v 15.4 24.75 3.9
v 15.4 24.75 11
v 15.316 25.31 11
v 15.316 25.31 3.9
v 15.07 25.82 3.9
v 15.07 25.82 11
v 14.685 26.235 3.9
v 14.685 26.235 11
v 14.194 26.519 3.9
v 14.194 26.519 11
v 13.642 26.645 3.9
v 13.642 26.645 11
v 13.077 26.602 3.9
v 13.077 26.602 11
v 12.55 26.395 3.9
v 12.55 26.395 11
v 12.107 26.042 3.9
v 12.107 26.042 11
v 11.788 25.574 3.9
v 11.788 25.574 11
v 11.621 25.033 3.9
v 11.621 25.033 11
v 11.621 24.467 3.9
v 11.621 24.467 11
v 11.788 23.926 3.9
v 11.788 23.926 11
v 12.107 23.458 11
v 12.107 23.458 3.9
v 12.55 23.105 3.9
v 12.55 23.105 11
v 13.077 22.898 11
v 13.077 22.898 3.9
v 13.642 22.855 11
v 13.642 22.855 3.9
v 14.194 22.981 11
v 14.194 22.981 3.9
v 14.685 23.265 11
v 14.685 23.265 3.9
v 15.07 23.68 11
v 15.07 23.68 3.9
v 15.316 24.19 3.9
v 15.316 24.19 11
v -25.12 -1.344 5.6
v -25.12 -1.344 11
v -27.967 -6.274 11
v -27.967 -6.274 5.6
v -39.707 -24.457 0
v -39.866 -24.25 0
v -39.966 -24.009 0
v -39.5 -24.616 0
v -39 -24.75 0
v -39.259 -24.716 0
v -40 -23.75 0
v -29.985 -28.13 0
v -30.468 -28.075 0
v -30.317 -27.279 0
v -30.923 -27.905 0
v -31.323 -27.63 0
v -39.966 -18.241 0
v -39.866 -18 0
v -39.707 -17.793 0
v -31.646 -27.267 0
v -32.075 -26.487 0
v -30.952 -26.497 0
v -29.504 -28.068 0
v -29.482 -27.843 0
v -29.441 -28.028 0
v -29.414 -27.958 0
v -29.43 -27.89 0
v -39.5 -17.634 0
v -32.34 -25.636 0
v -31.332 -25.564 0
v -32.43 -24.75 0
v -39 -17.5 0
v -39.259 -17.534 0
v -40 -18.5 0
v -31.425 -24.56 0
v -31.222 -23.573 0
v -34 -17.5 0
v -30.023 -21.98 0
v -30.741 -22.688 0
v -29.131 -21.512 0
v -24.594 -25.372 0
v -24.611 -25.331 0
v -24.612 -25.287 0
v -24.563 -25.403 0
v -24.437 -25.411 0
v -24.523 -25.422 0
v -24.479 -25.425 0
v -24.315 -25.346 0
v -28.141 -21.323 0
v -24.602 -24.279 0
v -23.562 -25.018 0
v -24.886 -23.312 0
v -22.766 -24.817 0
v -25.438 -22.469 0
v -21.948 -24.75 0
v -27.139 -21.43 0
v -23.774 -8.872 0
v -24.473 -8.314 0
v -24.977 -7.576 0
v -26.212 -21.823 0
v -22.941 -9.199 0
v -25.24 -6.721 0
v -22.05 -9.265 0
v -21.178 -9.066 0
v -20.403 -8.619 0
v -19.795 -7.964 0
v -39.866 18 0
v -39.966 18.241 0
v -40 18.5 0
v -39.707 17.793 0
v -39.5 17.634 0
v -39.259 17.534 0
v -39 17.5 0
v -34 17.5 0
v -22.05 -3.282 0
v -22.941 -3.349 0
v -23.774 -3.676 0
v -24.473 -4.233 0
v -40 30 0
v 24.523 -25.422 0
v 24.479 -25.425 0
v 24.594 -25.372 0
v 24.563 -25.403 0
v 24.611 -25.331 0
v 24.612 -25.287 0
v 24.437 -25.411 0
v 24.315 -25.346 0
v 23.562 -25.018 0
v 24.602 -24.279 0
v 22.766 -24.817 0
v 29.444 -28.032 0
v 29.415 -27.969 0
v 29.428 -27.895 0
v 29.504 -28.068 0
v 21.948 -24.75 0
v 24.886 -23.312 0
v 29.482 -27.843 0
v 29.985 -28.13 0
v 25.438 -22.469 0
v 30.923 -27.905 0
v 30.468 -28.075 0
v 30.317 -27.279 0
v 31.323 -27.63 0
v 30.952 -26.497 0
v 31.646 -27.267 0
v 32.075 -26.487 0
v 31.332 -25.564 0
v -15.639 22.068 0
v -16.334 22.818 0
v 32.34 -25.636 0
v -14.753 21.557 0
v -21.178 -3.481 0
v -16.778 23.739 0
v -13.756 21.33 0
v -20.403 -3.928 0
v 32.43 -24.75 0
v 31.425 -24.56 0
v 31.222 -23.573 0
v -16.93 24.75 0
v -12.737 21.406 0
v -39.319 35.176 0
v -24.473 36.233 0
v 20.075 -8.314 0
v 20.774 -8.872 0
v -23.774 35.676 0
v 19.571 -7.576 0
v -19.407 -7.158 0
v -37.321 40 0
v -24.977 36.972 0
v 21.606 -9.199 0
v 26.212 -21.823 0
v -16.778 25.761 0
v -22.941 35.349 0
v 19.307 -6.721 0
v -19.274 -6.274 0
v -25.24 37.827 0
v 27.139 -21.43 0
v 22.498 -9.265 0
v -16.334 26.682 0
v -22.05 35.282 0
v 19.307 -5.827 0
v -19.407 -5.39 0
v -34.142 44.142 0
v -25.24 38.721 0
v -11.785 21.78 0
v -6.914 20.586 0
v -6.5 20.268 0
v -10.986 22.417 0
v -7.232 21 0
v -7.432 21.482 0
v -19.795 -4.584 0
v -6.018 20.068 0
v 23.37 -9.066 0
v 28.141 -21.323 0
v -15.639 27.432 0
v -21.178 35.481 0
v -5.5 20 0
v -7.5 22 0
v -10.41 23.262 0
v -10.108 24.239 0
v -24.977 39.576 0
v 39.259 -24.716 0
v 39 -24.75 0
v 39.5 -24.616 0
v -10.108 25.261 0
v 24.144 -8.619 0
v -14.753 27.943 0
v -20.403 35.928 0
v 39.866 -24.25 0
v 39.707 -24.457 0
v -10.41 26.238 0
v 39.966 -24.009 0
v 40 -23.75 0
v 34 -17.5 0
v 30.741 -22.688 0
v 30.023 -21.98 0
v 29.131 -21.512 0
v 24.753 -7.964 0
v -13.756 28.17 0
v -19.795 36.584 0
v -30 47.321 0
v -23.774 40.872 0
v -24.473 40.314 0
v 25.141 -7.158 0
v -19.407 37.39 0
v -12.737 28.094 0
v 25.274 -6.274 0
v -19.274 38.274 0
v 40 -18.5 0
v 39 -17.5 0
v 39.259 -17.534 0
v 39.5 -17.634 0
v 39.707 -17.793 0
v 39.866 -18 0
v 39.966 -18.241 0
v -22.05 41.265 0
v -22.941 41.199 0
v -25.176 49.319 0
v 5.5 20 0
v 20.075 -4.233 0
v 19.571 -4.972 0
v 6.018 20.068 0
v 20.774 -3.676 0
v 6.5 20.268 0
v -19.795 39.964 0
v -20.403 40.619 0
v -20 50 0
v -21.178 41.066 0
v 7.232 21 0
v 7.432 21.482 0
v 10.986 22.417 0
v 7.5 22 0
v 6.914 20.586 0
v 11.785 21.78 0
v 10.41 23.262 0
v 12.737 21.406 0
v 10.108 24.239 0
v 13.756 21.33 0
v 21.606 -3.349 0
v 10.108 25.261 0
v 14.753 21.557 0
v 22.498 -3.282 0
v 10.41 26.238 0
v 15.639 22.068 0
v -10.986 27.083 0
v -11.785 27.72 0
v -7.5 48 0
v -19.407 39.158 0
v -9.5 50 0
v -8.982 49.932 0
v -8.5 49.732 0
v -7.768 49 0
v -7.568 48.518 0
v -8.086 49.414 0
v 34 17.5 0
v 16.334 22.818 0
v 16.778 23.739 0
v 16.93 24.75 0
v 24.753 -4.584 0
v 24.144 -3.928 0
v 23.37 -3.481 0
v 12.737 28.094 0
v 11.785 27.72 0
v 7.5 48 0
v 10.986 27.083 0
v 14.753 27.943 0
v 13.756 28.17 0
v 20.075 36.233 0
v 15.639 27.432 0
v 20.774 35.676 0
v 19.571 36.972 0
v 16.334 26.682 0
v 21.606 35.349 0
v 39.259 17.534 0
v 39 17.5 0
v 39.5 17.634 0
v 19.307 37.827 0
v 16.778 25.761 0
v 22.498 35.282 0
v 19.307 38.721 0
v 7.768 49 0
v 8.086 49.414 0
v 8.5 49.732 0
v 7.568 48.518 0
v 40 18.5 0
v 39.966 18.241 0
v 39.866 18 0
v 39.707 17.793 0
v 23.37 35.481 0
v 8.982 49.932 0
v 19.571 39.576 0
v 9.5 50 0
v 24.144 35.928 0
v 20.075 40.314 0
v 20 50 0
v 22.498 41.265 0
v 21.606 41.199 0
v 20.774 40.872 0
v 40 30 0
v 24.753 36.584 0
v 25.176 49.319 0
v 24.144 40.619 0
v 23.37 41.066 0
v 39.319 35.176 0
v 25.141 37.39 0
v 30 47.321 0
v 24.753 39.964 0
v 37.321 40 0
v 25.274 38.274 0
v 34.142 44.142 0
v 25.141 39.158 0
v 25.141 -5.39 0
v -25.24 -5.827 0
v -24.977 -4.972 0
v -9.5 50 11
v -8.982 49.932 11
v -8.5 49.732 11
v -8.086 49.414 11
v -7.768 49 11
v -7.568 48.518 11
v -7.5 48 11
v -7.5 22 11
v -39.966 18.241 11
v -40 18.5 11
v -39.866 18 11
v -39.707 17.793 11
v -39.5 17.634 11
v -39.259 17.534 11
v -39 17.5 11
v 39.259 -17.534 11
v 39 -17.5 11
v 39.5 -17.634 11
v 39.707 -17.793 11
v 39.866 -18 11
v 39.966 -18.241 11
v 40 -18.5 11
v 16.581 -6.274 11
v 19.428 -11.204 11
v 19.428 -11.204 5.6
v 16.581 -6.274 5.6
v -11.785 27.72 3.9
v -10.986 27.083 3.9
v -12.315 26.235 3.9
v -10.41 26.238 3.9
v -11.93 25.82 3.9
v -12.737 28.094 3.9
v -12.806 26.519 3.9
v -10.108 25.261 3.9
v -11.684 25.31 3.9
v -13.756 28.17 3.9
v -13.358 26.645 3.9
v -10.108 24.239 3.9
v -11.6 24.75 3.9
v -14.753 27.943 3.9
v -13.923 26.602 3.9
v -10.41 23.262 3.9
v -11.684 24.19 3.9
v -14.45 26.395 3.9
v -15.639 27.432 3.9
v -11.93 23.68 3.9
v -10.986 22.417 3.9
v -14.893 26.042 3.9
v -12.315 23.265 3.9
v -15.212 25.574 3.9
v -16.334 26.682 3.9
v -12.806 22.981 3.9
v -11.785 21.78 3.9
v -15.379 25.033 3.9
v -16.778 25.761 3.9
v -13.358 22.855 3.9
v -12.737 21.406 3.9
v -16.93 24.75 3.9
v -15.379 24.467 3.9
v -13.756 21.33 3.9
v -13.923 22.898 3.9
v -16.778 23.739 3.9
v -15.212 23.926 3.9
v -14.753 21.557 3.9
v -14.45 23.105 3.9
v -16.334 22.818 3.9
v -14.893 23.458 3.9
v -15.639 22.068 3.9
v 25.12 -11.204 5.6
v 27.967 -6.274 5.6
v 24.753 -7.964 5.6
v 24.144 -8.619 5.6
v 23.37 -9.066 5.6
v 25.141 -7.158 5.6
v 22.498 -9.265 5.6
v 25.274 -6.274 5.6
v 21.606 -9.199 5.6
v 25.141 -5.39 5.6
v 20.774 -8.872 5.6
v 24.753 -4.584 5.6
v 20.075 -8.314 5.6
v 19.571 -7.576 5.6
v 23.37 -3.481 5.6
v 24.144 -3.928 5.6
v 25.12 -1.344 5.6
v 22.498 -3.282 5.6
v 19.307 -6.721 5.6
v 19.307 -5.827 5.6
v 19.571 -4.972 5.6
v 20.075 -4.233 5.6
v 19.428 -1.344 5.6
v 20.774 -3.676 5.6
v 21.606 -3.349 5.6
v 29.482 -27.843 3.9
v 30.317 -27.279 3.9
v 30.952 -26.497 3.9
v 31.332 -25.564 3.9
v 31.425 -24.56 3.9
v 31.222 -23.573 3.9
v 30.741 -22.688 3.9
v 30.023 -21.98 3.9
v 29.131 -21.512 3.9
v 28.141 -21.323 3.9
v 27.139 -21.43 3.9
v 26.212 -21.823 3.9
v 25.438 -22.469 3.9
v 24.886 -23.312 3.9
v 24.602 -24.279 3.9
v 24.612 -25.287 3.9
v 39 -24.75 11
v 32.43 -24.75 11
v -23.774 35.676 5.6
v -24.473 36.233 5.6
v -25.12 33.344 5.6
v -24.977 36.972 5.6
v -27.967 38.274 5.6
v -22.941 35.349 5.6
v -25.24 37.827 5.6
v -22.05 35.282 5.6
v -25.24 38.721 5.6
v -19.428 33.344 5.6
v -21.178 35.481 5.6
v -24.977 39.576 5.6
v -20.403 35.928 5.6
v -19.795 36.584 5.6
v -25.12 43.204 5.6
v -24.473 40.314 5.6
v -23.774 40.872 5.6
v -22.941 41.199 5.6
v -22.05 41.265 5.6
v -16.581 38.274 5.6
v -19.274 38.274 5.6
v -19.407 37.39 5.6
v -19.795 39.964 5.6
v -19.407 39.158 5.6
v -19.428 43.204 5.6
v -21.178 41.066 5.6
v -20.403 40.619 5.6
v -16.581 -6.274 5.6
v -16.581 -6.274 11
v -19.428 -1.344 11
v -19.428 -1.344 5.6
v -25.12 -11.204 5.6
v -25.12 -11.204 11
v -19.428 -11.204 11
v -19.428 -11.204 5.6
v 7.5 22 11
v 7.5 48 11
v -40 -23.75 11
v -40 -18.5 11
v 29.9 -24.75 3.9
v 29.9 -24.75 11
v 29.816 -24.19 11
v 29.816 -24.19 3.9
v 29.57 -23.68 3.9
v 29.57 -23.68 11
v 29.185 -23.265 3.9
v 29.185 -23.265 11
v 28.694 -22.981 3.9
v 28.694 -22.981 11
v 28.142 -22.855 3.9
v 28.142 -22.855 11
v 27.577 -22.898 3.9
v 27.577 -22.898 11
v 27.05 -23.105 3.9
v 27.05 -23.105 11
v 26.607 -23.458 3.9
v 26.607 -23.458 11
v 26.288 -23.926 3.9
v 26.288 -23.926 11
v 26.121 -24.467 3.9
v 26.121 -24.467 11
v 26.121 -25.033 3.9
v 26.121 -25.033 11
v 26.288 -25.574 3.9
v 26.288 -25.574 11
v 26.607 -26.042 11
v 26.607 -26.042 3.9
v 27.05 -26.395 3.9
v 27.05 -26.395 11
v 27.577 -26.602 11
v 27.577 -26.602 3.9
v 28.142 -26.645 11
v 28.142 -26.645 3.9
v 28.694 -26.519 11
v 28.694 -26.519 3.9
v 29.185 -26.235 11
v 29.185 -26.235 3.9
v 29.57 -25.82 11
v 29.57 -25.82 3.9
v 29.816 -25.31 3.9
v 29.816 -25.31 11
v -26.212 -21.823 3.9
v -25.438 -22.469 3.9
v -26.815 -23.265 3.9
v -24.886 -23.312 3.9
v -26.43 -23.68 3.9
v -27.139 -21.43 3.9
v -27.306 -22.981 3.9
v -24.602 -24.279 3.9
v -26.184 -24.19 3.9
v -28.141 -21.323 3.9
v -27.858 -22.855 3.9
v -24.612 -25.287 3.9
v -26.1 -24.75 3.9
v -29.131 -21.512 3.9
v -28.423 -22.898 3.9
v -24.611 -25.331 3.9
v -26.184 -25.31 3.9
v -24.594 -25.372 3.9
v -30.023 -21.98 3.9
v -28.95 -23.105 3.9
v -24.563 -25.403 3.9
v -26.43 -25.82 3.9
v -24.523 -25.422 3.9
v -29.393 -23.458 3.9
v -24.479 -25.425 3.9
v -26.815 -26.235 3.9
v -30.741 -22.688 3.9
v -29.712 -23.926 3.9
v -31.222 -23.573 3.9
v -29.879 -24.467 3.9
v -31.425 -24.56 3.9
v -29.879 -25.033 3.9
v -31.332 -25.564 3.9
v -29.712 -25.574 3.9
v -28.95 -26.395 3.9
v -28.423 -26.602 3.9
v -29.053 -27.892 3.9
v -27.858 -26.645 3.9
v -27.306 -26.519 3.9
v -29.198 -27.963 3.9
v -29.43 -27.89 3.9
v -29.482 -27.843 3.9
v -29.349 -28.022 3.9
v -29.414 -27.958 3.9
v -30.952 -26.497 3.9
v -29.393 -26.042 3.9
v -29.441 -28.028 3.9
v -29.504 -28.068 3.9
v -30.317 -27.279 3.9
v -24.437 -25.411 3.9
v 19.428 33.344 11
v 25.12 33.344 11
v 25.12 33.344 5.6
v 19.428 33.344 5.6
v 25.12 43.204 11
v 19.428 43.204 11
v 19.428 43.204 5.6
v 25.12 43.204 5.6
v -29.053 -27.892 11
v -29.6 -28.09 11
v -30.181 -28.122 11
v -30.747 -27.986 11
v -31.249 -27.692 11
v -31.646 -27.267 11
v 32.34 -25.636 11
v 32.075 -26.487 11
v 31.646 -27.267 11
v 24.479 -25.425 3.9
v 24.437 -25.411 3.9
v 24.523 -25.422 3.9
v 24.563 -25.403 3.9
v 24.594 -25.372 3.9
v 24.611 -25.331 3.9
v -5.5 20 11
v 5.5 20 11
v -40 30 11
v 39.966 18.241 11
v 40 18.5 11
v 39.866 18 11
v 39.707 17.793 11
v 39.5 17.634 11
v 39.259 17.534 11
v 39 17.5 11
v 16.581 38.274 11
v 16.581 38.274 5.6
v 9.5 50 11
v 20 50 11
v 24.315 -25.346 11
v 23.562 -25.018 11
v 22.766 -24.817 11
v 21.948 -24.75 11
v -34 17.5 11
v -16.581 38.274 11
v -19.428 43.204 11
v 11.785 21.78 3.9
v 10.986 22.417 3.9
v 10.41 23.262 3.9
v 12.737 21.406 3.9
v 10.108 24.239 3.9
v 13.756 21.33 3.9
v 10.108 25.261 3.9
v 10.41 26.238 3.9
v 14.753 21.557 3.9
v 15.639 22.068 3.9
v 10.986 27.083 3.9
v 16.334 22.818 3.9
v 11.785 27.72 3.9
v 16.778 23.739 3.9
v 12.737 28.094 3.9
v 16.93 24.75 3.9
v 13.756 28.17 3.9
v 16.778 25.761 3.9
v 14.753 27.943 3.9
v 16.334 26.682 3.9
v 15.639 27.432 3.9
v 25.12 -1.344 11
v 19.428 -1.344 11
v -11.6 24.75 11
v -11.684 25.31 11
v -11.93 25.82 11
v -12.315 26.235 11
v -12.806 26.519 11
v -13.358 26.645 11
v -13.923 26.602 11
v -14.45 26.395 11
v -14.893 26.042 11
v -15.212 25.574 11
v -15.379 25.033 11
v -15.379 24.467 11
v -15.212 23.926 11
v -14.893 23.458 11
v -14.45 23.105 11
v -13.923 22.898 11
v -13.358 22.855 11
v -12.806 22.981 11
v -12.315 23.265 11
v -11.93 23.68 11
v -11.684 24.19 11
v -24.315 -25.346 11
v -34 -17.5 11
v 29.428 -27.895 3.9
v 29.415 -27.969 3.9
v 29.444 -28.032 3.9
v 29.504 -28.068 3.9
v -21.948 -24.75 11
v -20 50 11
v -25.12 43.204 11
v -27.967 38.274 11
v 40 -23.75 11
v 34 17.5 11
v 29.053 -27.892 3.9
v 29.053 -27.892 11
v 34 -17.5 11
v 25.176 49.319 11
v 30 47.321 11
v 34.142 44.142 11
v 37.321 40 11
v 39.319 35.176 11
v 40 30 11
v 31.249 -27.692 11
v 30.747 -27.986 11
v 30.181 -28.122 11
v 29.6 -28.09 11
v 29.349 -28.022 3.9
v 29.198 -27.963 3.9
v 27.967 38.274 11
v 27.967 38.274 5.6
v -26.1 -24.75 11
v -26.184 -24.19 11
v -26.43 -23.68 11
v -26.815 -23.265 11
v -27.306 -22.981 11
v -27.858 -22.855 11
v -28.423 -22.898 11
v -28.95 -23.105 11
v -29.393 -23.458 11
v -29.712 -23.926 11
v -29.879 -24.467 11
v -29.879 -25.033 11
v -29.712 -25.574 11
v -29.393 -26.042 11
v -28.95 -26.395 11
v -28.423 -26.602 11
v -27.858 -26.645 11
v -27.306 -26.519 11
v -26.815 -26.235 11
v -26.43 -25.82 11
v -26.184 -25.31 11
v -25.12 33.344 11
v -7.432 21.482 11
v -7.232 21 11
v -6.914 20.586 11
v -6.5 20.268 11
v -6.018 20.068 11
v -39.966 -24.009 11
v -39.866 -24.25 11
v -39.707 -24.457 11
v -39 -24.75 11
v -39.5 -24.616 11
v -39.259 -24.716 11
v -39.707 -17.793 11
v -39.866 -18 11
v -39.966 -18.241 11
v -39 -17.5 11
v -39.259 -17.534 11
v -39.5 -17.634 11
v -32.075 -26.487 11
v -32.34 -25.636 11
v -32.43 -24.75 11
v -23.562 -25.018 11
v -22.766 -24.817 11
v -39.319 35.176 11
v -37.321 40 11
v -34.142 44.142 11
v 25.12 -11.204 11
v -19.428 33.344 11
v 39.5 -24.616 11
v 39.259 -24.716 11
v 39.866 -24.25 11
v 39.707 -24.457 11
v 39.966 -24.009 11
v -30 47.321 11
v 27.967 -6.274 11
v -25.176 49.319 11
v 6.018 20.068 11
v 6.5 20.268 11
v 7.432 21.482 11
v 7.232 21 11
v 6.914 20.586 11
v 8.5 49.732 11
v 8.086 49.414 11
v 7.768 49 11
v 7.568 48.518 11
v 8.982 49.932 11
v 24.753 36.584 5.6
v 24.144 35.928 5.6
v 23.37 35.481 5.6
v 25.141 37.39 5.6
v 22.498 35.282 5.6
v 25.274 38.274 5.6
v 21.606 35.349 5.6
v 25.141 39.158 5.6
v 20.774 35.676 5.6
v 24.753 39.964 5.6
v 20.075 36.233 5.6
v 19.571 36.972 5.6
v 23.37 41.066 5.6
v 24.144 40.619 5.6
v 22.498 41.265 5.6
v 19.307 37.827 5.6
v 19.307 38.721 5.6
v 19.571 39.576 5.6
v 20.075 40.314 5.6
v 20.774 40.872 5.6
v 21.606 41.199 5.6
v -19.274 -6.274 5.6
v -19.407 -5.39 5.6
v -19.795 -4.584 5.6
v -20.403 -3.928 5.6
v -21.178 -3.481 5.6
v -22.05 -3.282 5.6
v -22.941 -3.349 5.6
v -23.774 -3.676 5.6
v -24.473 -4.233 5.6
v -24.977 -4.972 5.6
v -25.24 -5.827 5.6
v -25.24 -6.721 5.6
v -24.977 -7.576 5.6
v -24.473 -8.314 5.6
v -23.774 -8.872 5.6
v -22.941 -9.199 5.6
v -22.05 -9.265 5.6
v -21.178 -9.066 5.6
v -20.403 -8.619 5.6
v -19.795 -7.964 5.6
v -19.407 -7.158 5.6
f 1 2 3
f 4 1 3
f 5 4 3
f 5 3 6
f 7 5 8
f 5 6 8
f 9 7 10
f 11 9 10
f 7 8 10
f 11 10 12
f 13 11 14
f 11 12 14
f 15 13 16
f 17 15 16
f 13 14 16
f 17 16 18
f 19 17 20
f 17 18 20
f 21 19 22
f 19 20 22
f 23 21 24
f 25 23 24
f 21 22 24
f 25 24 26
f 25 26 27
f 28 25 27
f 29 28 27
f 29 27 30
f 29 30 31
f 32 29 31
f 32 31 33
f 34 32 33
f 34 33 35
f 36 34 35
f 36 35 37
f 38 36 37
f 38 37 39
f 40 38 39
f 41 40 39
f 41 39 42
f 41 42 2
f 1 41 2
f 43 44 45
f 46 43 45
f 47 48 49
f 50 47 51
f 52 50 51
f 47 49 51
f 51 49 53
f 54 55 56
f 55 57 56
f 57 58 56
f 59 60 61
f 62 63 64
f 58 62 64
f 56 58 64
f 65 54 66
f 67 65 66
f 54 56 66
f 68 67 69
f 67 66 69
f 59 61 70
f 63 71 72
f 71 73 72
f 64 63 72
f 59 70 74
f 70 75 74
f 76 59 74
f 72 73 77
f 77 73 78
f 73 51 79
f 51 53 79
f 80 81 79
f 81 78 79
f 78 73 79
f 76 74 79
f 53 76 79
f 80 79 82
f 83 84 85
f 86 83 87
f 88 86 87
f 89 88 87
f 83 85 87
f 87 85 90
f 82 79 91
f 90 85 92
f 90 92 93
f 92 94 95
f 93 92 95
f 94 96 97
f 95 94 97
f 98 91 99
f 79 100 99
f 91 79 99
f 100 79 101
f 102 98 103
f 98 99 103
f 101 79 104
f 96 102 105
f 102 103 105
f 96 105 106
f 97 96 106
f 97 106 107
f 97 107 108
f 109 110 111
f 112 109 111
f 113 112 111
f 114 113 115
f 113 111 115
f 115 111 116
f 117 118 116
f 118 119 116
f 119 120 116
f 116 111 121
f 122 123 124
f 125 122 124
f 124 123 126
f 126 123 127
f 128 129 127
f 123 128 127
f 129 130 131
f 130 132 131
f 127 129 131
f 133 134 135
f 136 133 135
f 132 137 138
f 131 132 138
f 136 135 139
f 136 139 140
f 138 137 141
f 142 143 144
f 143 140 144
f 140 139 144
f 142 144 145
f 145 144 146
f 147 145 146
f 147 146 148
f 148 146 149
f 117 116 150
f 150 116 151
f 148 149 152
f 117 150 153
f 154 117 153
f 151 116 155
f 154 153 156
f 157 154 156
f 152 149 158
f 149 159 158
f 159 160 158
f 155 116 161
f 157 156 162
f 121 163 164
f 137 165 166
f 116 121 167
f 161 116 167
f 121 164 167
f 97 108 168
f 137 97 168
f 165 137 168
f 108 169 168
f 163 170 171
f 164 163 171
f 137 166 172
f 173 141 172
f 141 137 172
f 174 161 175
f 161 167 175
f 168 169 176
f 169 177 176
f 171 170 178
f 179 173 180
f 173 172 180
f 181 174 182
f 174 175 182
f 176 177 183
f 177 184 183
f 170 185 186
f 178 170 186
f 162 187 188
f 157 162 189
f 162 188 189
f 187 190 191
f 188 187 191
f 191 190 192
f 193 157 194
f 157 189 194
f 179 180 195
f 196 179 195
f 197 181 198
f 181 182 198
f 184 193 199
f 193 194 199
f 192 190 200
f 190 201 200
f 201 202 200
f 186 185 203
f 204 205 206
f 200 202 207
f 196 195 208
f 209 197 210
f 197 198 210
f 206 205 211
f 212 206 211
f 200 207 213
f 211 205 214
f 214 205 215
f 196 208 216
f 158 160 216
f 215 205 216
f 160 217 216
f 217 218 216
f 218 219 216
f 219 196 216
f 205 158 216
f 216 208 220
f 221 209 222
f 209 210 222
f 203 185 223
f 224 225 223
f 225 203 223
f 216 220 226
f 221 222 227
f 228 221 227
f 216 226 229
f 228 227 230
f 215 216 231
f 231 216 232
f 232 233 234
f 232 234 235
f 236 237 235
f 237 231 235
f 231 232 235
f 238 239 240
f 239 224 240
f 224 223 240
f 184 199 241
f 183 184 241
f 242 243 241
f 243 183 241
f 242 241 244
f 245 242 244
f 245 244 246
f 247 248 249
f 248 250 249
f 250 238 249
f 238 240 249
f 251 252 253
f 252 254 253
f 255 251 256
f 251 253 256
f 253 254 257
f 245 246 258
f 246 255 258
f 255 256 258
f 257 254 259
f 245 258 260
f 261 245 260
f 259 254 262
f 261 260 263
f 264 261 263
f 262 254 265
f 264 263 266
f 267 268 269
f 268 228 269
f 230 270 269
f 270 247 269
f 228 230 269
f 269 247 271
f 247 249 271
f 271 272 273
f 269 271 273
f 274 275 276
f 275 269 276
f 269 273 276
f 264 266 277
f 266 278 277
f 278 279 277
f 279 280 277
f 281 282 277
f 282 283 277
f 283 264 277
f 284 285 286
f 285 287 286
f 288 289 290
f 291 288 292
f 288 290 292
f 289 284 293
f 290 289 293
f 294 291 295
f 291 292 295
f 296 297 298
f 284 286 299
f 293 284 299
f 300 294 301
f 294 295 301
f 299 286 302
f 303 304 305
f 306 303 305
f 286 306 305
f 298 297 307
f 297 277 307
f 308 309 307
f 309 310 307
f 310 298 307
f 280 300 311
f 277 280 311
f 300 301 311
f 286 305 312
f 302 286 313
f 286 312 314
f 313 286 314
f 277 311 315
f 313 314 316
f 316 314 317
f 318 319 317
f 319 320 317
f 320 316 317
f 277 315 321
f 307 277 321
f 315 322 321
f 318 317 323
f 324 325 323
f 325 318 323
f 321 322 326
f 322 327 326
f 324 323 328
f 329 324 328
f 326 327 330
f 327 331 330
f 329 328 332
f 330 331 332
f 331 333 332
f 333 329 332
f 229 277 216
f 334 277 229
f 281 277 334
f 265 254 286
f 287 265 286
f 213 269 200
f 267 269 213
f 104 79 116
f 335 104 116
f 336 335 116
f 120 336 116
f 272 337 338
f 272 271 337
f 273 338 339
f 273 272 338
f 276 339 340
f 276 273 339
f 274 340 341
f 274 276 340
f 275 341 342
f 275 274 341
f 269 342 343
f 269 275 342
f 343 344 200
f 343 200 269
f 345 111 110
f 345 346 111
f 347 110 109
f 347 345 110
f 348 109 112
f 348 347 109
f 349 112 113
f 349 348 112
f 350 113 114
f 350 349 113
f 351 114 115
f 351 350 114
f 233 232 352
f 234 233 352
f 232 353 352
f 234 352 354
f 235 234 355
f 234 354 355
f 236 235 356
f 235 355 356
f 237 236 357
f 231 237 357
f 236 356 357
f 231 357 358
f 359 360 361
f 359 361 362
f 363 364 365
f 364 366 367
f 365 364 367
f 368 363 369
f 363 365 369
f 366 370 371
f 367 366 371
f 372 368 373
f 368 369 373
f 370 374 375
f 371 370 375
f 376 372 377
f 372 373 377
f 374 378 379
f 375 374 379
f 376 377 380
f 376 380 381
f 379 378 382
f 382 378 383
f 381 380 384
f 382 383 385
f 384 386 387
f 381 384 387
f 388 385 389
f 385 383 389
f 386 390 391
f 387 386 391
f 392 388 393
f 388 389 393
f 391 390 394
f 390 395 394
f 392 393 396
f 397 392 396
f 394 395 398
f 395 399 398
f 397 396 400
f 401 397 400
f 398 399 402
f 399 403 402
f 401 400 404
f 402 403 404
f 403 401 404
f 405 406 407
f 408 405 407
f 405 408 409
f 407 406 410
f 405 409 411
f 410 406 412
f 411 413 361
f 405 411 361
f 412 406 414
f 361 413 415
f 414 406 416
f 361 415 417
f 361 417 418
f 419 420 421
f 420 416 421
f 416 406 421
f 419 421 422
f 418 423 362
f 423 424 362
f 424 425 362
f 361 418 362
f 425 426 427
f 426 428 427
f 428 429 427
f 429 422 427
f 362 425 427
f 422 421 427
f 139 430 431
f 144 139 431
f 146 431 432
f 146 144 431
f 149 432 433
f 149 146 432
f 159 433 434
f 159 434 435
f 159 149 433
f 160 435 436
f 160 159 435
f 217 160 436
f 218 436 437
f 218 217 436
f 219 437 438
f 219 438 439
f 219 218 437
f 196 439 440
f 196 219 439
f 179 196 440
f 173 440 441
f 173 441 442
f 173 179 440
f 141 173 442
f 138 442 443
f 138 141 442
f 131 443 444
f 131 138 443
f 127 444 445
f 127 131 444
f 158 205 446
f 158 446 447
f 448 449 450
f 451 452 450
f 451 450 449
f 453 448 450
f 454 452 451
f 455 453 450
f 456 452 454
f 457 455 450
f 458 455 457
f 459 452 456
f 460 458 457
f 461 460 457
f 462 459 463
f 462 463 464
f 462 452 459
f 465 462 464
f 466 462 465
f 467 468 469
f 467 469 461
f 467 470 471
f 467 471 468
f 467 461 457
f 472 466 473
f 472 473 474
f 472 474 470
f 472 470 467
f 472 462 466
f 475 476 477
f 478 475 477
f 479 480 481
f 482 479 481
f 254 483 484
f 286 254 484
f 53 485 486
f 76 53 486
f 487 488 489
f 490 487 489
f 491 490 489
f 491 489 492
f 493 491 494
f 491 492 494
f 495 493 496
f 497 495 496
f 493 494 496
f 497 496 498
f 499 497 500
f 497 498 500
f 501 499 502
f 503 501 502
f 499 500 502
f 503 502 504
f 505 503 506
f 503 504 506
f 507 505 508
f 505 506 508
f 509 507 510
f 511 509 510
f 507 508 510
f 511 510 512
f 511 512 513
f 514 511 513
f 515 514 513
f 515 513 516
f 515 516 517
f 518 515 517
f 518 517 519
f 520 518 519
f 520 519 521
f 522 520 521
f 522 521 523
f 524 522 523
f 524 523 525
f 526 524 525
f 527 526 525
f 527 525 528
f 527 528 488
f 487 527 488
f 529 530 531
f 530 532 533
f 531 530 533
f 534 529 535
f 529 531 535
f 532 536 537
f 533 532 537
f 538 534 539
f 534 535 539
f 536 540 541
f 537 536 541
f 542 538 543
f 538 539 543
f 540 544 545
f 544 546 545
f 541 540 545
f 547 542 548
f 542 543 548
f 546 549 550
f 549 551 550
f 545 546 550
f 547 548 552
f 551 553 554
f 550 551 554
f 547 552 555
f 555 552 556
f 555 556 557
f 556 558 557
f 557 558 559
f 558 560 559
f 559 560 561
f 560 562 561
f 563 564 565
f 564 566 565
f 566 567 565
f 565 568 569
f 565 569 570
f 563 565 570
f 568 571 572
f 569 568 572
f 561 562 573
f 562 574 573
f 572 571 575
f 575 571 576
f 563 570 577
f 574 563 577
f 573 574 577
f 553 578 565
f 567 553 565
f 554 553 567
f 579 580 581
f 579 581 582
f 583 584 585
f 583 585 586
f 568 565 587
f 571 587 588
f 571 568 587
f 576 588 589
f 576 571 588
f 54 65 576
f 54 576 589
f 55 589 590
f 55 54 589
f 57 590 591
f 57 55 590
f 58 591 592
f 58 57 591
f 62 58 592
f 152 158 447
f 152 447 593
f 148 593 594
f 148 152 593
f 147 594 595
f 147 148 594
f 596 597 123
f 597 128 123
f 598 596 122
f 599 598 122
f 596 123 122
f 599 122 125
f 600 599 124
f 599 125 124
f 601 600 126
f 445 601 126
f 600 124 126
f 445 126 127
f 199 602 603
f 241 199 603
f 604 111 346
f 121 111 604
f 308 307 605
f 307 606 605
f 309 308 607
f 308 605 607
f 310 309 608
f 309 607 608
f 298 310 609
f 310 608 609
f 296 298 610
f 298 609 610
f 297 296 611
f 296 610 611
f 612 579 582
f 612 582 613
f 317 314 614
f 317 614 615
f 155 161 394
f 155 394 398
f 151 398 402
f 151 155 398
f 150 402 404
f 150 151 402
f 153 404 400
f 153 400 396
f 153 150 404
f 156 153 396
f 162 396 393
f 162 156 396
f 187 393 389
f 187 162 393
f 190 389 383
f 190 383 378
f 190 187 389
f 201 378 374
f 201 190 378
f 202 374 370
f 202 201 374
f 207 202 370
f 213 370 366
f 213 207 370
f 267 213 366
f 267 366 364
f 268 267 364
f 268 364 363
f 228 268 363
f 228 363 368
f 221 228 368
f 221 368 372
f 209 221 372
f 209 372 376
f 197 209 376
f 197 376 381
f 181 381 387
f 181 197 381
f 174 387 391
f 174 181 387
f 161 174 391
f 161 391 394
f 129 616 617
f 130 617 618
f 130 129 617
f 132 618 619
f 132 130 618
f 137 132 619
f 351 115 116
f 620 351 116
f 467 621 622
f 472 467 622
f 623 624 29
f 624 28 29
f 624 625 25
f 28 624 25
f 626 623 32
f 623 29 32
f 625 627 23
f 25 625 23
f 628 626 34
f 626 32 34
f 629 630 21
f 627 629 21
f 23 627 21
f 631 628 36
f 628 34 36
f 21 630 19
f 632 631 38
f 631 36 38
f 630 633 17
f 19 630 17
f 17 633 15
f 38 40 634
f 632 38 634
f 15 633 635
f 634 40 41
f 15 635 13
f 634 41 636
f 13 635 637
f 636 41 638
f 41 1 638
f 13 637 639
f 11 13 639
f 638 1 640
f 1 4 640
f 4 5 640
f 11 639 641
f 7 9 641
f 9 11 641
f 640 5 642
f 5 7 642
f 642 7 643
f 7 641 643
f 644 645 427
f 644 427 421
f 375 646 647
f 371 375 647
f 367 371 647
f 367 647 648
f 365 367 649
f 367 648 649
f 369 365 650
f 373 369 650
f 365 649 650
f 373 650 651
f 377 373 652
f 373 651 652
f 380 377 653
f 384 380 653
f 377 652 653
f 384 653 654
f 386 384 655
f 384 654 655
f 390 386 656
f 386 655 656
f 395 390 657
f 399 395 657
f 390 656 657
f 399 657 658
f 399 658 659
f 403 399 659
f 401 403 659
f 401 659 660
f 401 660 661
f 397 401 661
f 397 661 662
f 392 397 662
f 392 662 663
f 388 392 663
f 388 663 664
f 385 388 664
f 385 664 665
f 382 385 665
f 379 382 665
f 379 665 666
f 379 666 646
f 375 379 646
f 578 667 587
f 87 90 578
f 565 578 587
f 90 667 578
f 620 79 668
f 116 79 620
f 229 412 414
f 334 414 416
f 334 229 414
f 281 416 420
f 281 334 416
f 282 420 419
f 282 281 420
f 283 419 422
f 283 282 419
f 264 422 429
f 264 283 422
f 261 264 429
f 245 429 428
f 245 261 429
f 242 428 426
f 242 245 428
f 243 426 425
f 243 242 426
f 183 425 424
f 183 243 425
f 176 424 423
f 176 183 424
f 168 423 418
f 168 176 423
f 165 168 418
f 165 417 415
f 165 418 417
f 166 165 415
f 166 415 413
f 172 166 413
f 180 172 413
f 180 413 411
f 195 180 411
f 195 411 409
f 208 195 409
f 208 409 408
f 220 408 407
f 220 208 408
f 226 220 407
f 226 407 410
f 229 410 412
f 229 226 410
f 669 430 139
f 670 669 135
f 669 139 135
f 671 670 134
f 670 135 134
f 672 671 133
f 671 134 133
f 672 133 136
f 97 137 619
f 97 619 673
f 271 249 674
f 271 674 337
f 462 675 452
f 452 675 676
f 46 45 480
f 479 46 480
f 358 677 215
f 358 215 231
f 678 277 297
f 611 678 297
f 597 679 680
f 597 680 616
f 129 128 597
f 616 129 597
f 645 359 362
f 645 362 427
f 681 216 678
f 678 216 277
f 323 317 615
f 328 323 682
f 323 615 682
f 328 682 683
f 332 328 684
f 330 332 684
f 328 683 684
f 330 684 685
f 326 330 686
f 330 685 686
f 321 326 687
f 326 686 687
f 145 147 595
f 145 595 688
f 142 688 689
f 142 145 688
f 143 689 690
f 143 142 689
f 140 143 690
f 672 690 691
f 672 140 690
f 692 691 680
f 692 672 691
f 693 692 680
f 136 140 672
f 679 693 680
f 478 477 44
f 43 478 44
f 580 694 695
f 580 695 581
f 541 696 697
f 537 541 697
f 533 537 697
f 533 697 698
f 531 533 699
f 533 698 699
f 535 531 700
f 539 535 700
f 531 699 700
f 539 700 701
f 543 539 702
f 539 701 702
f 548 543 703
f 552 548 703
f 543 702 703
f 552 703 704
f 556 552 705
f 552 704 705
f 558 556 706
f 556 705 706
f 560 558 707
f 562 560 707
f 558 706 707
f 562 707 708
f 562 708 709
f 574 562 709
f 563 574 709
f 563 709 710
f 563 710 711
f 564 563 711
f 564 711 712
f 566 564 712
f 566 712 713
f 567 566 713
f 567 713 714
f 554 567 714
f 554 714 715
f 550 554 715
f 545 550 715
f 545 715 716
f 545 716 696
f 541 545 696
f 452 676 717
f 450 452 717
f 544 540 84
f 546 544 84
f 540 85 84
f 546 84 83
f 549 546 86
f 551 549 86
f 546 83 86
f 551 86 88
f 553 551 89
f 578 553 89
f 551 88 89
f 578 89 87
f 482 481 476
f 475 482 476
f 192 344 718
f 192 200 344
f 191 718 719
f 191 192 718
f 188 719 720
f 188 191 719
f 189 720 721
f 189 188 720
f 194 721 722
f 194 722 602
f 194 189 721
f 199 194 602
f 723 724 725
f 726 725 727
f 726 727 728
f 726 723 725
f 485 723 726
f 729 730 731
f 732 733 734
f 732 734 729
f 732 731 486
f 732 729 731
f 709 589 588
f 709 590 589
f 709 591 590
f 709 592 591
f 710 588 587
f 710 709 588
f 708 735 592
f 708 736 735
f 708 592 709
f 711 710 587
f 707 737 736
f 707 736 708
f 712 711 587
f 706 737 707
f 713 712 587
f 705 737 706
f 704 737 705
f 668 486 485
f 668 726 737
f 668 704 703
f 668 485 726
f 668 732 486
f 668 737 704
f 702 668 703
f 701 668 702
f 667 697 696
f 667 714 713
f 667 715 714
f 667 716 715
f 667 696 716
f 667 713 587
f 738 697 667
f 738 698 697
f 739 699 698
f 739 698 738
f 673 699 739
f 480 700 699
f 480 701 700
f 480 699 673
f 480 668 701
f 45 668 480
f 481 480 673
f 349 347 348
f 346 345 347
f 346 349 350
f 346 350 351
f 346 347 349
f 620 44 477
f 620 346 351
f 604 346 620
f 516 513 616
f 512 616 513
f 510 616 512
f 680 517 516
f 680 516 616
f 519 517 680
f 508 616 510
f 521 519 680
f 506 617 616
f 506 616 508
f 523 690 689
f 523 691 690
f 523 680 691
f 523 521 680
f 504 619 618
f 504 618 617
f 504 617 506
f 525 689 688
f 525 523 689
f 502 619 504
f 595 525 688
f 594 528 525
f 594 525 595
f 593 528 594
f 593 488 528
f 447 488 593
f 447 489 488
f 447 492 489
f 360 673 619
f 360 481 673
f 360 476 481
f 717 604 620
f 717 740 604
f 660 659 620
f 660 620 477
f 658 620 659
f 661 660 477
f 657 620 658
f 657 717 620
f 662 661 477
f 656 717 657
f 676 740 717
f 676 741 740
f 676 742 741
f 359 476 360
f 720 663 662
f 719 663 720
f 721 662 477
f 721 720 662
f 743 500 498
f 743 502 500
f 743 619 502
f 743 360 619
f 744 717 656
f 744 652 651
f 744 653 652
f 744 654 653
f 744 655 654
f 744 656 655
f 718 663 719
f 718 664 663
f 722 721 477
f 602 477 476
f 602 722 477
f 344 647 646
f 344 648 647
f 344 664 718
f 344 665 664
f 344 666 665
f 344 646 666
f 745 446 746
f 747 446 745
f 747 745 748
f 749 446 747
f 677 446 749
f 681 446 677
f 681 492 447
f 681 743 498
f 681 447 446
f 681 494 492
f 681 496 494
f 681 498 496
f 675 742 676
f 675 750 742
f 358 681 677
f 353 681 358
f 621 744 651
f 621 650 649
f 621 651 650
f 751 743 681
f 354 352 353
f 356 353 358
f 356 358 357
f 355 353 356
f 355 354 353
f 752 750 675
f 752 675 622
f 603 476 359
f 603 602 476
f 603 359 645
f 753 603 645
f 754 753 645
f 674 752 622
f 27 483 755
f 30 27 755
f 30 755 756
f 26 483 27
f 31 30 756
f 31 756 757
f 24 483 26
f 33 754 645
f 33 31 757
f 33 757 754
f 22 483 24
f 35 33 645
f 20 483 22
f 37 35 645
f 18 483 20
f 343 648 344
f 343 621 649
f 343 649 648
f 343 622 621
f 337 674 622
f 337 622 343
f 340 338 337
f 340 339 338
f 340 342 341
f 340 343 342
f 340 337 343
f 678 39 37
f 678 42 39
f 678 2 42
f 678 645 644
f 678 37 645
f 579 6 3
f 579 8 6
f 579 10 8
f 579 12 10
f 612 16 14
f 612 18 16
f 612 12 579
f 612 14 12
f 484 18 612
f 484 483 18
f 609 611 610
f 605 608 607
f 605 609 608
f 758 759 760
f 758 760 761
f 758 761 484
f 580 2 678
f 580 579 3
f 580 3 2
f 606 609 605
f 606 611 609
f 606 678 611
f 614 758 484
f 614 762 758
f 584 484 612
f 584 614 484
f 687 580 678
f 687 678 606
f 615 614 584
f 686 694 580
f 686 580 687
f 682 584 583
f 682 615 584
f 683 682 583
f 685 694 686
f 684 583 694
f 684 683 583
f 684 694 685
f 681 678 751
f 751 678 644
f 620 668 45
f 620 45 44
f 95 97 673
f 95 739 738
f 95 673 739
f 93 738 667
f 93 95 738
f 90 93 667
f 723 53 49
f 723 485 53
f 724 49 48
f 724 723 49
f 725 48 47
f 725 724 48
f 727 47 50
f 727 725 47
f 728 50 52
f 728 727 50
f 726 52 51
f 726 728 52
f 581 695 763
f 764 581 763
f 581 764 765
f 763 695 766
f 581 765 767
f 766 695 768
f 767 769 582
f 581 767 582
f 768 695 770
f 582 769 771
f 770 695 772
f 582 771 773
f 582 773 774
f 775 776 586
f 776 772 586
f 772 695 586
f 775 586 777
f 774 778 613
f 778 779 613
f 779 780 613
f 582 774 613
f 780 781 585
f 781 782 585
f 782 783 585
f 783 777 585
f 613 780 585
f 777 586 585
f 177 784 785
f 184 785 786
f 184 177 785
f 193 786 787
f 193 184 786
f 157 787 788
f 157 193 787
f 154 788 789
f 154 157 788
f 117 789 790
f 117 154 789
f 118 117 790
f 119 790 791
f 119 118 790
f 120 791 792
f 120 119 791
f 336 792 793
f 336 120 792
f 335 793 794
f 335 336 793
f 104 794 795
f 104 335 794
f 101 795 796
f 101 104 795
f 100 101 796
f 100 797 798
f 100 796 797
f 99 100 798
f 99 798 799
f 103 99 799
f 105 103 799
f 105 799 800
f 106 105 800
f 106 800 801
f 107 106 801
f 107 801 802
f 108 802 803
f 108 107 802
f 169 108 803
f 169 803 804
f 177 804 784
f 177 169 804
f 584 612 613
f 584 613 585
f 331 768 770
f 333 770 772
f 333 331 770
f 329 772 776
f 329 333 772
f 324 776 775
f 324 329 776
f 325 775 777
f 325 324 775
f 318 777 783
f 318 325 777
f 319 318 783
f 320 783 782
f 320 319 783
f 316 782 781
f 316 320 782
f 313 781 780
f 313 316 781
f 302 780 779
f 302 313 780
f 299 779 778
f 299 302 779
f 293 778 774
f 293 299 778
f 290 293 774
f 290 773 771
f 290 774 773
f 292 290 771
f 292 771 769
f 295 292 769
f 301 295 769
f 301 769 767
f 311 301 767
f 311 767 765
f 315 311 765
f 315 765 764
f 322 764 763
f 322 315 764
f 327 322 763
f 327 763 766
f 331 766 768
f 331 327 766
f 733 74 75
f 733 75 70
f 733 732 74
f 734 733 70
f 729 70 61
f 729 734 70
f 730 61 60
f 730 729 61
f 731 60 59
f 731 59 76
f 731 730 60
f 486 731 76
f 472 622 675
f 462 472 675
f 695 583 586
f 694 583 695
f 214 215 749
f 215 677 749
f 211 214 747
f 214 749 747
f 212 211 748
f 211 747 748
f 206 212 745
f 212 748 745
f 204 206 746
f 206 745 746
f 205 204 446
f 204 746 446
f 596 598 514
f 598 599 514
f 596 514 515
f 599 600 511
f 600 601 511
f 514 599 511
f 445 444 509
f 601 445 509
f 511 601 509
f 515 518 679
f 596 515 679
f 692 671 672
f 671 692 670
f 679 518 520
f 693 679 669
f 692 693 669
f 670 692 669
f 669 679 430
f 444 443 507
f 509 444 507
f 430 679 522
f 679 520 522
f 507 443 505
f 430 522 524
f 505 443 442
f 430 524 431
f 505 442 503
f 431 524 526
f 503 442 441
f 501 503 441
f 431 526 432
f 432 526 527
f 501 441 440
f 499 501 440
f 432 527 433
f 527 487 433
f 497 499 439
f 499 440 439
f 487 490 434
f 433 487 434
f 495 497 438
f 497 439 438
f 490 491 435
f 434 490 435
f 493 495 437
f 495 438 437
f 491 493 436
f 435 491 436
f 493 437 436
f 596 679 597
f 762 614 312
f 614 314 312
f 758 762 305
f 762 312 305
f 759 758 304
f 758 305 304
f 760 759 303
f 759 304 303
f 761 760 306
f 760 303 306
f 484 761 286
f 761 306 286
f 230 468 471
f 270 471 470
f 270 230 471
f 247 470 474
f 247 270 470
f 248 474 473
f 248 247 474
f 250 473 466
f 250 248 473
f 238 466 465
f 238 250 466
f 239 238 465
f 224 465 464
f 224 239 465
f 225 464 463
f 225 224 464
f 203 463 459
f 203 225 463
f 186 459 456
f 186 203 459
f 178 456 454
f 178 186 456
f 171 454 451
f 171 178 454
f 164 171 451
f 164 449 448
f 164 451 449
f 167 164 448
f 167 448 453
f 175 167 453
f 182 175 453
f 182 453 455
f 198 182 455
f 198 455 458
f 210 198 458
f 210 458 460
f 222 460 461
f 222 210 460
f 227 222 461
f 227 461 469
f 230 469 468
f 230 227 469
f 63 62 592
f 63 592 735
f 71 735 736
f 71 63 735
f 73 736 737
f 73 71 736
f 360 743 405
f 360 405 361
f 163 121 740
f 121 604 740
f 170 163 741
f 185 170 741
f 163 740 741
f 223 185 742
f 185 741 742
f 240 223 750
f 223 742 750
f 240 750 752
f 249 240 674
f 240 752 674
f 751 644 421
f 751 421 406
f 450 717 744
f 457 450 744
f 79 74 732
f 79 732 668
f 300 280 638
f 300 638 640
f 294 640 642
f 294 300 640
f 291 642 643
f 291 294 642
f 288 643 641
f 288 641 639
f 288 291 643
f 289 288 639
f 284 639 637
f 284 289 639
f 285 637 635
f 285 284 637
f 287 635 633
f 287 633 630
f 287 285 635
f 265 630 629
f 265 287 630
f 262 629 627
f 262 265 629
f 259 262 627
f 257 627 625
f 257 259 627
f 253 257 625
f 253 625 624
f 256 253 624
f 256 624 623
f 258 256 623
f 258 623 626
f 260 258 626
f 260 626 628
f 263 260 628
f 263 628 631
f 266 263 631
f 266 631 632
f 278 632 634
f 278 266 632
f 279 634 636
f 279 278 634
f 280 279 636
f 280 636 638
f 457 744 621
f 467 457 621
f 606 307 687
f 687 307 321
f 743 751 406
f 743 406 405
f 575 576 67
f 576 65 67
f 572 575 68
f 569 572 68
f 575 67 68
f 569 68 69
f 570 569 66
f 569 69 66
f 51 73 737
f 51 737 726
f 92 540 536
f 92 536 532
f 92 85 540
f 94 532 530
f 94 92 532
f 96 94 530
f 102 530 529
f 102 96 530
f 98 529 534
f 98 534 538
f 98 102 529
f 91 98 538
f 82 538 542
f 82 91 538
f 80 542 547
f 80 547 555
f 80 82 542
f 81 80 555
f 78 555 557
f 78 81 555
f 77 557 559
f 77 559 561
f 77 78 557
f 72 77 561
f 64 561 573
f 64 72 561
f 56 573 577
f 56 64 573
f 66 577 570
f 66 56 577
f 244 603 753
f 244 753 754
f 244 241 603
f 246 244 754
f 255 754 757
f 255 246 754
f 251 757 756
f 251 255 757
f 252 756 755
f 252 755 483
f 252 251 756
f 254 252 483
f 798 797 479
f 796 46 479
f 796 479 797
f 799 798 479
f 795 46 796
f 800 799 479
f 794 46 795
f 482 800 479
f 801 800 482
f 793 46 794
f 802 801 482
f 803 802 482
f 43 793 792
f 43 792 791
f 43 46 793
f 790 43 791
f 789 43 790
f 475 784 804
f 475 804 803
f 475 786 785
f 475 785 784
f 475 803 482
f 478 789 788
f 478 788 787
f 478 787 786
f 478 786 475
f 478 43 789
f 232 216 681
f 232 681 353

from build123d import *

# Parameters (mm, degrees)
SKETCH_1_W                   = 80
SKETCH_1_H                   = 100
EXTRUDE_1_DEPTH              = 11
SKETCH_7_W                   = 15
SKETCH_7_H                   = 30
CUT_EXTRUDE_1_DEPTH          = 16
HOLE_WIZARD_M4_1_D           = 3.3
HOLE_WIZARD_M4_1_CSINK_D     = 4.05
HOLE_WIZARD_M4_1_CSINK_ANGLE = 90
FILLET_1_R                   = 20
FILLET_2_R                   = 2
SKETCH_9_W                   = 6
SKETCH_9_H                   = 35
CUT_EXTRUDE_2_DEPTH          = 11
SKETCH_11_R                  = 3
CUT_EXTRUDE_4_DEPTH          = 15
SKETCH_12_R                  = 3.43
CUT_EXTRUDE_5_DEPTH          = 3.9
CUT_EXTRUDE_6_DEPTH          = 5.4
CUT_EXTRUDE_7_DEPTH          = 14
SKETCH_15_R                  = 1.9
CUT_EXTRUDE_8_DEPTH          = 14
FILLET_4_R                   = 0.12
FILLET_5_R                   = 1


with BuildPart() as part:
    # 草图1 → 凸台-拉伸1 (new body)
    with BuildSketch(Plane.XY):
        Rectangle(SKETCH_1_W, SKETCH_1_H)
    extrude(amount=EXTRUDE_1_DEPTH)

    # 草图7 → 切除-拉伸1 (cut)
    with BuildSketch(Plane.XY.offset(11)):
        with Locations((0, 35)):
            Rectangle(SKETCH_7_W, SKETCH_7_H)
    extrude(amount=-CUT_EXTRUDE_1_DEPTH, mode=Mode.SUBTRACT)

    # M4 螺纹孔1 (through all)
    with Locations(Plane(origin=(13.5, 24.75, 0), x_dir=(-1, 0, 0), z_dir=(0, 0, -1))):
        with Locations((0, 0), (27, 0), (41.5, -49.5), (-14.5, -49.5)):
            CounterSinkHole(HOLE_WIZARD_M4_1_D / 2, HOLE_WIZARD_M4_1_CSINK_D / 2, counter_sink_angle=HOLE_WIZARD_M4_1_CSINK_ANGLE)

    # 圆角1
    fillet_1_edges = [part.edges().sort_by_distance(p)[0] for p in [
        (-40, 50, 5.5),
        (40, 50, 5.5),
    ]]
    fillet(fillet_1_edges, radius=FILLET_1_R)

    # 圆角2
    fillet_2_edges = [part.edges().sort_by_distance(p)[0] for p in [
        (-7.5, 20, 5.5),
        (-7.5, 50, 5.5),
        (7.5, 50, 5.5),
        (7.5, 20, 5.5),
        (40, -50, 5.5),
        (-40, -50, 5.5),
    ]]
    fillet(fillet_2_edges, radius=FILLET_2_R)

    # 草图9 → 切除-拉伸2 (cut)
    with BuildSketch(Plane.XY):
        with Locations((37, 0)):
            Rectangle(SKETCH_9_W, SKETCH_9_H)
        with Locations((-37, 0)):
            Rectangle(SKETCH_9_W, SKETCH_9_H)
    extrude(amount=CUT_EXTRUDE_2_DEPTH, mode=Mode.SUBTRACT)

    # 草图11 → 切除-拉伸4 (cut)
    with BuildSketch(Plane.XY):
        with Locations((-22.273863607, 38.273863607)):
            Circle(SKETCH_11_R)
        with Locations((22.273863607, 38.273863607)):
            Circle(SKETCH_11_R)
        with Locations((22.273863607, -6.273863607)):
            Circle(SKETCH_11_R)
        with Locations((-22.273863607, -6.273863607)):
            Circle(SKETCH_11_R)
    extrude(amount=CUT_EXTRUDE_4_DEPTH, mode=Mode.SUBTRACT)

    # 草图12 → 切除-拉伸5 (cut)
    with BuildSketch(Plane.XY):
        with Locations((13.5, 24.75)):
            Circle(SKETCH_12_R)
        with Locations((28, -24.75)):
            Circle(SKETCH_12_R)
        with Locations(Location((-28, -24.75, 0), (0, 0, 180))):
            Circle(SKETCH_12_R)
        with Locations(Location((-13.5, 24.75, 0), (0, 0, 180))):
            Circle(SKETCH_12_R)
    extrude(amount=CUT_EXTRUDE_5_DEPTH, mode=Mode.SUBTRACT)

    # 草图13 → 切除-拉伸6 (cut)
    with BuildSketch(Plane.XY.offset(11)):
        Polygon((-19.42752678, 33.343863607), (-16.581189953, 38.273863607), (-19.42752678, 43.203863607), (-25.120200434, 43.203863607), (-27.966537262, 38.273863607), (-25.120200434, 33.343863607), align=None)
        Polygon((-19.42752678, -11.203863607), (-16.581189953, -6.273863607), (-19.42752678, -1.343863607), (-25.120200434, -1.343863607), (-27.966537262, -6.273863607), (-25.120200434, -11.203863607), align=None)
        Polygon((25.120200434, -11.203863607), (19.42752678, -11.203863607), (16.581189953, -6.273863607), (19.42752678, -1.343863607), (25.120200434, -1.343863607), (27.966537262, -6.273863607), align=None)
        Polygon((25.120200434, 33.343863607), (19.42752678, 33.343863607), (16.581189953, 38.273863607), (19.42752678, 43.203863607), (25.120200434, 43.203863607), (27.966537262, 38.273863607), align=None)
    extrude(amount=-CUT_EXTRUDE_6_DEPTH, mode=Mode.SUBTRACT)

    # 草图14 → 切除-拉伸7 (cut)
    with BuildSketch(Plane(origin=(0, 0, 0), x_dir=(-1, 0, 0), z_dir=(0, 0, -1))):
        with BuildLine():
            Line((-42.281489137, -24.75), (-32.43, -24.75))
            ThreePointArc((-32.43, -24.75), (-32.229391744, -26.068008147), (-31.645735677, -27.266646852))
            ThreePointArc((-31.645735677, -27.266646852), (-30.468858677, -28.074682546), (-29.053003561, -27.892157349))
            Line((-29.053003561, -27.892157349), (-24.314984036, -25.345764556))
            ThreePointArc((-24.314984036, -25.345764556), (-23.168394001, -24.901228134), (-21.947979567, -24.75))
            Line((-21.947979567, -24.75), (21.947979567, -24.75))
            ThreePointArc((21.947979567, -24.75), (23.168394001, -24.901228134), (24.314984036, -25.345764556))
            Line((24.314984036, -25.345764556), (29.053003561, -27.892157349))
            ThreePointArc((29.053003561, -27.892157349), (30.468858677, -28.074682546), (31.645735677, -27.266646852))
            ThreePointArc((31.645735677, -27.266646852), (32.229391744, -26.068008147), (32.43, -24.75))
            Line((32.43, -24.75), (45.771408099, -24.75))
            Line((45.771408099, -24.75), (45.771408099, -58.548543379))
            Line((45.771408099, -58.548543379), (-42.281489137, -58.548543379))
            Line((-42.281489137, -58.548543379), (-42.281489137, -24.75))
        make_face()
    extrude(amount=-CUT_EXTRUDE_7_DEPTH, mode=Mode.SUBTRACT)

    # 草图15 → 切除-拉伸8 (cut)
    with BuildSketch(Plane.XY.offset(11)):
        with Locations((-13.5, 24.75)):
            Circle(SKETCH_15_R)
        with Locations((-28, -24.75)):
            Circle(SKETCH_15_R)
        with Locations((13.5, 24.75)):
            Circle(SKETCH_15_R)
        with Locations((28, -24.75)):
            Circle(SKETCH_15_R)
    extrude(amount=-CUT_EXTRUDE_8_DEPTH, mode=Mode.SUBTRACT)

    # 圆角4
    fillet_4_edges = [part.edges().sort_by_distance(p)[0] for p in [
        (24.660163825, -25.531277369, 1.95),
        (29.199579974, -27.963395071, 1.95),
        (-29.199579974, -27.963395071, 1.95),
        (-24.660163825, -25.531277369, 1.95),
    ]]
    fillet(fillet_4_edges, radius=FILLET_4_R)

    # 圆角5
    fillet_5_edges = [part.edges().sort_by_distance(p)[0] for p in [
        (40, -17.5, 5.5),
        (40, 17.5, 5.5),
        (-40, 17.5, 5.5),
        (-40, -17.5, 5.5),
        (40, -24.75, 5.5),
        (-40, -24.75, 5.5),
    ]]
    fillet(fillet_5_edges, radius=FILLET_5_R)


solid = part.part
